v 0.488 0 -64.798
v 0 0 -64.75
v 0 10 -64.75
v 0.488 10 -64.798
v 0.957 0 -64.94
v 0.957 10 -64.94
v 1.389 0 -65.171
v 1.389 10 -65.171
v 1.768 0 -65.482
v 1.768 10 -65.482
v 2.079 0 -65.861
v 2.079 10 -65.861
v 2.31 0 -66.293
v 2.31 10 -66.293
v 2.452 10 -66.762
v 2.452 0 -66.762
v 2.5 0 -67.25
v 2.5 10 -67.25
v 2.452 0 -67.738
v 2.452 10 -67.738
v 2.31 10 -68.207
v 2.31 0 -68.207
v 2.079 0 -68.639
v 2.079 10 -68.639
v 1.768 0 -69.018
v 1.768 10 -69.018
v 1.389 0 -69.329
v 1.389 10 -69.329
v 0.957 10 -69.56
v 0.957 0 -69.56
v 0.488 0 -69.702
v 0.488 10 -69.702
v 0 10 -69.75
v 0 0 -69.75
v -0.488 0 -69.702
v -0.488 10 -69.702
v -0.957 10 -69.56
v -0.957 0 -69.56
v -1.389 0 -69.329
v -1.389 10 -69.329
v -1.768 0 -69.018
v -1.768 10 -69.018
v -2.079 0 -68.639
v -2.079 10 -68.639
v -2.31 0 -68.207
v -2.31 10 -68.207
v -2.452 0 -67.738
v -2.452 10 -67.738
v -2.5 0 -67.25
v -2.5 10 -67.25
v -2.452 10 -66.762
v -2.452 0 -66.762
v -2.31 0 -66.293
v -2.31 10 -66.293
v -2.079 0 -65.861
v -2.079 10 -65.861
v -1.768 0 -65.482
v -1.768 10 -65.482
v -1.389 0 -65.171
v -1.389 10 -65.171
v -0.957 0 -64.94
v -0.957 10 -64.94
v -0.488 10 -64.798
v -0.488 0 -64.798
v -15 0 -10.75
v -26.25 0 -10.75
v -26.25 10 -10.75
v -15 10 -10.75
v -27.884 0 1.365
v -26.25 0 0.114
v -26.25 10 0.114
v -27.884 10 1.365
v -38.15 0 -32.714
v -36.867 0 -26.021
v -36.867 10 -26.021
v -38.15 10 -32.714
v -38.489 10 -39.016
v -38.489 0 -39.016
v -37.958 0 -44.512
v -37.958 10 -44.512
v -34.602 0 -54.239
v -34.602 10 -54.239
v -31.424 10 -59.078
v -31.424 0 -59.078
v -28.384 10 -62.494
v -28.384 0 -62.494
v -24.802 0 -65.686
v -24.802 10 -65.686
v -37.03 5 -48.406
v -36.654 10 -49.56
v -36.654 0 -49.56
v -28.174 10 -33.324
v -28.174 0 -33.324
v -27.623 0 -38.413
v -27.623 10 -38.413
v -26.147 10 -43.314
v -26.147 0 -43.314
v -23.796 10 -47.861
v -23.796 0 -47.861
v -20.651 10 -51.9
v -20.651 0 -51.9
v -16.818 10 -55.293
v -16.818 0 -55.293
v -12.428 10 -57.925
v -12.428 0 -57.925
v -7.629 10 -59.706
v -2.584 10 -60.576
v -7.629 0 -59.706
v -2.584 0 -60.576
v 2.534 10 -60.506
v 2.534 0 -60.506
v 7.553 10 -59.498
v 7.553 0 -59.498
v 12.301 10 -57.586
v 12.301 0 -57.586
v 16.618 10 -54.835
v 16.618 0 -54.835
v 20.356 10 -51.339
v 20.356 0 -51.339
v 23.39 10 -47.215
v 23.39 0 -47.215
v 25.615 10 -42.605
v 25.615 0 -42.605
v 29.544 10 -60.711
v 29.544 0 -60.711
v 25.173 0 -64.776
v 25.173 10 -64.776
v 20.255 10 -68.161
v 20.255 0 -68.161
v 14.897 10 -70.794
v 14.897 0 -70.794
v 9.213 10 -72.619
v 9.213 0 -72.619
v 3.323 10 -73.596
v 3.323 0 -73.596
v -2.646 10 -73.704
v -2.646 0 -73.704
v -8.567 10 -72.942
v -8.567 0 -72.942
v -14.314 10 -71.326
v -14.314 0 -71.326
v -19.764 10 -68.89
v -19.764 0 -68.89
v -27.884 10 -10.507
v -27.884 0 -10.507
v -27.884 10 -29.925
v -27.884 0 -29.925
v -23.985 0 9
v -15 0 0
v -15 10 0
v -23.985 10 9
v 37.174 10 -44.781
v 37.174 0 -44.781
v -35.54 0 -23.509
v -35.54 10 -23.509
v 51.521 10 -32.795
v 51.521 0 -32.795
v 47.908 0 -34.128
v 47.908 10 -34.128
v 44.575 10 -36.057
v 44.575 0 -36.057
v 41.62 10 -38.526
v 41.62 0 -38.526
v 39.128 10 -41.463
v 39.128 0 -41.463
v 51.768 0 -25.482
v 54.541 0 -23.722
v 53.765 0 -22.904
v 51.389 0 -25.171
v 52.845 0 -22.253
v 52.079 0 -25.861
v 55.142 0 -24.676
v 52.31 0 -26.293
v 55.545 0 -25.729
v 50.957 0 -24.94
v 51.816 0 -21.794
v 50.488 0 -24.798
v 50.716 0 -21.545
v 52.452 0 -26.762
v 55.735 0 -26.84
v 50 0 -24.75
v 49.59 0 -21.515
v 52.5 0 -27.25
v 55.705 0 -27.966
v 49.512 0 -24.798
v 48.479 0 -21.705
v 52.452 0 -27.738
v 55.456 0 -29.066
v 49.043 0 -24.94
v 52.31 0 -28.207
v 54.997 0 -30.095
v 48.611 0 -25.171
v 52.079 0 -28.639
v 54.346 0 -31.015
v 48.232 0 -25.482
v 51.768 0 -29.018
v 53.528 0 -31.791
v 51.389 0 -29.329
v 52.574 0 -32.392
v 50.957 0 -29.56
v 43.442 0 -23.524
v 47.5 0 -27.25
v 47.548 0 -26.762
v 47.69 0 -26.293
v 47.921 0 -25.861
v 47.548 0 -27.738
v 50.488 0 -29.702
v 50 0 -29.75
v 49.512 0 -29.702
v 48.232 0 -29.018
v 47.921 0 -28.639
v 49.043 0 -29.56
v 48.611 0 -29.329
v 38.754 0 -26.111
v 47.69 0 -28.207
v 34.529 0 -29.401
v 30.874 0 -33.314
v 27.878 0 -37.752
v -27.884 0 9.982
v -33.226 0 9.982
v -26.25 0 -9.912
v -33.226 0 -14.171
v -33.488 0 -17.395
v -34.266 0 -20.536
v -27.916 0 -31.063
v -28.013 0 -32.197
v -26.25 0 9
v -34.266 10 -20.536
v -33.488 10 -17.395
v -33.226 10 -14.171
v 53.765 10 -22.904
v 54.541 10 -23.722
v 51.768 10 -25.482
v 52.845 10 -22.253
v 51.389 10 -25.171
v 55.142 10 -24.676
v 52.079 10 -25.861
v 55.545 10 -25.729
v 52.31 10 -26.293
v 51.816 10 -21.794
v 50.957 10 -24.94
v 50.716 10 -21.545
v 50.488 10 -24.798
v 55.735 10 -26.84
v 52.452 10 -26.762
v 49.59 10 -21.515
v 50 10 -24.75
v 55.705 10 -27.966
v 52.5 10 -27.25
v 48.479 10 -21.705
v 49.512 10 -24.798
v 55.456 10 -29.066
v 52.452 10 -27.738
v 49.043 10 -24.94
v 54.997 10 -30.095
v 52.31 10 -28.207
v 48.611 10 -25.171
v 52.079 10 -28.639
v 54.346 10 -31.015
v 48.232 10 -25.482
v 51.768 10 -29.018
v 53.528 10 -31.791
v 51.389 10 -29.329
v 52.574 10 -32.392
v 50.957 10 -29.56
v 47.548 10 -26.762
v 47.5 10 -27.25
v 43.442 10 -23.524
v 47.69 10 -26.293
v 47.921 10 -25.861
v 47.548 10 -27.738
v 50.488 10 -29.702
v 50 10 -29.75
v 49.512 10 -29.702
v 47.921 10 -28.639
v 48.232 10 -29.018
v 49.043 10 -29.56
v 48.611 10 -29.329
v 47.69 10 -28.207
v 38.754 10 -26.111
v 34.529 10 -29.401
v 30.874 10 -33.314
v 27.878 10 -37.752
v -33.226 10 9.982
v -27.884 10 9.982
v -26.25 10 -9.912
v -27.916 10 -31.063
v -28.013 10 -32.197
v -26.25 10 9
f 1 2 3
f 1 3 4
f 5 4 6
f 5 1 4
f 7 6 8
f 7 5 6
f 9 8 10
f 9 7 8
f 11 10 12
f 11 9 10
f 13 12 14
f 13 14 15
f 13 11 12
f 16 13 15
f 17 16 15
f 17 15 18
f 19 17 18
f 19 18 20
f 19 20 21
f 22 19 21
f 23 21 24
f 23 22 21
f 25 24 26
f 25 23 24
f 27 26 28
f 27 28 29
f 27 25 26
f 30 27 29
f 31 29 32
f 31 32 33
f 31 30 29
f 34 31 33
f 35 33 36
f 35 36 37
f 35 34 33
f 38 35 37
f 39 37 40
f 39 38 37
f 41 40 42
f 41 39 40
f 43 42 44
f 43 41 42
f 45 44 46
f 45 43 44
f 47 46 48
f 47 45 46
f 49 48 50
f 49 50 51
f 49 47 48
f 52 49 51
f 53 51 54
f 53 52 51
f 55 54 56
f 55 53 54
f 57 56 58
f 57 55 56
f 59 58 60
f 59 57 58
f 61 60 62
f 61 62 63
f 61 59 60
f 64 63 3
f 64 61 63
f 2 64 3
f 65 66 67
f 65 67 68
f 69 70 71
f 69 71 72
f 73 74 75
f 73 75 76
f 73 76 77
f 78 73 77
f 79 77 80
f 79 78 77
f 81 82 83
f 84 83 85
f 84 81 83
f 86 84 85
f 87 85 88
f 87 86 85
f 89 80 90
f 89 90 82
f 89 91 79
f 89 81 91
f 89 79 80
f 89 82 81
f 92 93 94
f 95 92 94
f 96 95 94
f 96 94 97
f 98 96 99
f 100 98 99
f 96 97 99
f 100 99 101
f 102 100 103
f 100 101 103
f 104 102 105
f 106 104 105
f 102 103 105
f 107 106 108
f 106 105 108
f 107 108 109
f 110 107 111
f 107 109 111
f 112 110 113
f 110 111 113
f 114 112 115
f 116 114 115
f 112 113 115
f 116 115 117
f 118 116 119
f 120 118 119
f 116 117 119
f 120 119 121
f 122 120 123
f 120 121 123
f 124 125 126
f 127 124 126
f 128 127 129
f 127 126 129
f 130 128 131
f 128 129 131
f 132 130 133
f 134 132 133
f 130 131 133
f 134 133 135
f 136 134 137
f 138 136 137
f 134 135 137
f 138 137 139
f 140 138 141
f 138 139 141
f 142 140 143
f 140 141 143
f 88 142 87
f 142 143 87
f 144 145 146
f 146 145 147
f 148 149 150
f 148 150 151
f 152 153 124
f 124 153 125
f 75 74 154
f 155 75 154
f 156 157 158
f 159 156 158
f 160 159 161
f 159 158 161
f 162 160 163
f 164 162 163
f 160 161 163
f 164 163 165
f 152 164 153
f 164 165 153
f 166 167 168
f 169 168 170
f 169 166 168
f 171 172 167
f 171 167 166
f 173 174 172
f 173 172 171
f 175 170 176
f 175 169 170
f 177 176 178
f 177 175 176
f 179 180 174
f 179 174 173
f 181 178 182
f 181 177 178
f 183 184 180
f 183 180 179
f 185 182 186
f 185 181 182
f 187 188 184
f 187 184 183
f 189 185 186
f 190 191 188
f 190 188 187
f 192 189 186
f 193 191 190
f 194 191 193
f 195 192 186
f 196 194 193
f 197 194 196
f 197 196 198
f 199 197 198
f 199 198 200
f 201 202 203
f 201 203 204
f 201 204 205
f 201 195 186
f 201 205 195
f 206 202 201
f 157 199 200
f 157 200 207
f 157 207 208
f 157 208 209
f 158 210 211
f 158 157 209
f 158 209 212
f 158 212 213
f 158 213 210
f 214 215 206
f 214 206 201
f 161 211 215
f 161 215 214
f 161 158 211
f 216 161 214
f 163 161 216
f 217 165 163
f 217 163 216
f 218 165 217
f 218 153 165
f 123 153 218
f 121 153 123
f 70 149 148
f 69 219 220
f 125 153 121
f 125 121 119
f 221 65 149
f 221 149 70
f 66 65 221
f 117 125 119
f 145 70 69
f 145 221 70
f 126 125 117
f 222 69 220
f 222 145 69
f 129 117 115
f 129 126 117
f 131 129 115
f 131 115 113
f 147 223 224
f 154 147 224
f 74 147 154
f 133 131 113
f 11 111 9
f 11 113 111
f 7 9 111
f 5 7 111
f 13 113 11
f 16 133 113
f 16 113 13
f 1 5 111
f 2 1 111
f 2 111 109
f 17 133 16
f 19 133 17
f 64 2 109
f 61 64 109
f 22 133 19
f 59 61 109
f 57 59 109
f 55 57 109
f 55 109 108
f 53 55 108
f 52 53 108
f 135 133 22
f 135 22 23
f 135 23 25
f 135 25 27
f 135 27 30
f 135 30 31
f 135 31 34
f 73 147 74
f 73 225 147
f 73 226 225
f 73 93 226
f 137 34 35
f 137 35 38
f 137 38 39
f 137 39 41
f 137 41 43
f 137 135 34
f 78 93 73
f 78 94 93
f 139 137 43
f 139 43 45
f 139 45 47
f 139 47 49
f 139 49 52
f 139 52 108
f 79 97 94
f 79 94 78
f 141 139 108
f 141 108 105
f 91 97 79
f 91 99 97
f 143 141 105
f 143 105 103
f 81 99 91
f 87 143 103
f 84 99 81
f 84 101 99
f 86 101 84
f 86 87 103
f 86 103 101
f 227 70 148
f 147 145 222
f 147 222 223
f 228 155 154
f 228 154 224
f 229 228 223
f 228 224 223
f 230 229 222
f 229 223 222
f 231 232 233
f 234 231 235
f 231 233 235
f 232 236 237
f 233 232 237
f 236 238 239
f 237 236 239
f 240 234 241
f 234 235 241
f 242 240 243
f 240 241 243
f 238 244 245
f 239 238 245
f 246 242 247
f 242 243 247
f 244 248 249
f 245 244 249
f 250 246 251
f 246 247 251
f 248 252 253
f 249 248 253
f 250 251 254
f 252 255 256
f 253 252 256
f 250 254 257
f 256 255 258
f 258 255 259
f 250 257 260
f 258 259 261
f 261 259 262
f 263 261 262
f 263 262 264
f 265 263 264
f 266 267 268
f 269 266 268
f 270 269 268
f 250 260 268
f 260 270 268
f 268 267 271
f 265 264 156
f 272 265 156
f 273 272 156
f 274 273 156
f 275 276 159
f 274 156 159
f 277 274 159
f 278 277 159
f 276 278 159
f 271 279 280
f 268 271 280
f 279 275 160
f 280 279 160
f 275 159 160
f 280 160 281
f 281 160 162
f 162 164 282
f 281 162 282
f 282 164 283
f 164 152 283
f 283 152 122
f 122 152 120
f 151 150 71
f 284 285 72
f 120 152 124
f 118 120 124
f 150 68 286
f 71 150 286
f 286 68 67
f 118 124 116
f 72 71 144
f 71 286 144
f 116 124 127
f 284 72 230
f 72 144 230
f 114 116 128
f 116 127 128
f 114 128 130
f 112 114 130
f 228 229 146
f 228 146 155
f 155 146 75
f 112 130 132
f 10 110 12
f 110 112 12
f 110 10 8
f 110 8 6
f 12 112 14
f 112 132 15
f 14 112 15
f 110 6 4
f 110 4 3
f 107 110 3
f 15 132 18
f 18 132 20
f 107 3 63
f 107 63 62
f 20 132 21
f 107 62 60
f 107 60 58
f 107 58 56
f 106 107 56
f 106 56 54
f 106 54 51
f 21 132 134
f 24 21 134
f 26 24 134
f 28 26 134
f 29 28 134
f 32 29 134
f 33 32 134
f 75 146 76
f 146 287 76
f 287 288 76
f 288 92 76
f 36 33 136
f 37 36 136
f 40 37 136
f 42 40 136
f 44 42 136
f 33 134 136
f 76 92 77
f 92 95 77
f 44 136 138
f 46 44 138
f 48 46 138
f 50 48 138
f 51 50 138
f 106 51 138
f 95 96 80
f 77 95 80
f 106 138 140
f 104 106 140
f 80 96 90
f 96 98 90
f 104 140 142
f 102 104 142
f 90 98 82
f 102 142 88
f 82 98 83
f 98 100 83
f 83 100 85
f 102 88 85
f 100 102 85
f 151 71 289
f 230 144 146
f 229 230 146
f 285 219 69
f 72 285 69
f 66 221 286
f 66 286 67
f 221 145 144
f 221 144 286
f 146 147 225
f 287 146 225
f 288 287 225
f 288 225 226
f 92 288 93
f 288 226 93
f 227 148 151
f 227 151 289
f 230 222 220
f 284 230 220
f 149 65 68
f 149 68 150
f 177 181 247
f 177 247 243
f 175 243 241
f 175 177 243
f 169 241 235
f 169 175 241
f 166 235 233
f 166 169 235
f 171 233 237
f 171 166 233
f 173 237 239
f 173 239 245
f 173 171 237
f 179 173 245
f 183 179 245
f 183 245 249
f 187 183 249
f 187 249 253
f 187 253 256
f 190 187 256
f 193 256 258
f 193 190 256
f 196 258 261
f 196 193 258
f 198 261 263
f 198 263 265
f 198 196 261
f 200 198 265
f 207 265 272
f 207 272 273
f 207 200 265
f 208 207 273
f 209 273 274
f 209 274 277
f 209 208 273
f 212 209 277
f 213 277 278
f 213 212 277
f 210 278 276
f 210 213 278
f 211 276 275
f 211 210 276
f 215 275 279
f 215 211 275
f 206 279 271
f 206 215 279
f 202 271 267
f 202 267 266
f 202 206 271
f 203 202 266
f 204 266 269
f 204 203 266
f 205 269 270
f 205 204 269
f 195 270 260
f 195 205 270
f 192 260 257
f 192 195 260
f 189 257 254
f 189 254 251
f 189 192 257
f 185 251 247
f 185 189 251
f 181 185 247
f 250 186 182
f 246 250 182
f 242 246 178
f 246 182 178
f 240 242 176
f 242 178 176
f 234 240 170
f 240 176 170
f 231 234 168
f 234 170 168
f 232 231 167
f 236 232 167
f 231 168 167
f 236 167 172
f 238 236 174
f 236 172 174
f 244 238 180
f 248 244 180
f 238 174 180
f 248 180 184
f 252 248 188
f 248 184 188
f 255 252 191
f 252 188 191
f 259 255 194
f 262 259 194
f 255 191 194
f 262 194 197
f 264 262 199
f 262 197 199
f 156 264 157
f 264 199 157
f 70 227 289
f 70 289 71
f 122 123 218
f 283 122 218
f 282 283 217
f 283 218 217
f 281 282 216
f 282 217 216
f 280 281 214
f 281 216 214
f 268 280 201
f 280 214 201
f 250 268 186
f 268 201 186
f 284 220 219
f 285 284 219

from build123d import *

# Parameters (mm, degrees)
SKETCH2_R           = 2.5
BOSS_EXTRUDE1_DEPTH = 10
BOSS_EXTRUDE2_DEPTH = 10


with BuildPart() as part:
    # Sketch2 → Boss-Extrude1 (new body)
    with BuildSketch(Plane(origin=(0, 0, 0), x_dir=(1, 0, 0), z_dir=(0, 1, 0))):
        with BuildLine():
            Line((-33.226342232, -9.981880582), (-27.883647244, -9.981880582))
            Line((-27.883647244, -9.981880582), (-27.883647244, 29.925281779))
            ThreePointArc((-27.883647244, 29.925281779), (-27.956490633, 31.630693582), (-28.174490185, 33.323682587))
            ThreePointArc((-28.174490185, 33.323682587), (-5.126582747, 60.257622762), (25.614975975, 42.605434852))
            ThreePointArc((25.614975975, 42.605434852), (34.529334698, 29.401291822), (48.478573237, 21.70493367))
            ThreePointArc((48.478573237, 21.70493367), (55.54506633, 25.728573237), (51.521426763, 32.79506633))
            ThreePointArc((51.521426763, 32.79506633), (43.044695487, 37.228328186), (37.173927096, 44.781000713))
            Line((37.173927096, 44.781000713), (29.544453309, 60.710630122))
            ThreePointArc((29.544453309, 60.710630122), (3.323171133, 73.595527675), (-24.801894282, 65.686234454))
            add(Edge.make_bspline(
                [(-36.866842145, 26.021473673), (-43.224794525, 50.957582374), (-24.801894282, 65.686234454)],
                knots=[0, 0, 0, 1, 1, 1], degree=2))
            Line((-36.866842145, 26.021473673), (-35.540312543, 23.509134839))
            ThreePointArc((-35.540312543, 23.509134839), (-33.813452265, 18.981182225), (-33.226342232, 14.170807697))
            Line((-33.226342232, 14.170807697), (-33.226342232, -9.981880582))
        make_face()
        with Locations(Location((0, 67.25, 0), (0, 0, 270))):
            Circle(SKETCH2_R, mode=Mode.SUBTRACT)
        with Locations(Location((50, 27.25, 0), (0, 0, 270))):
            Circle(SKETCH2_R, mode=Mode.SUBTRACT)
    extrude(amount=BOSS_EXTRUDE1_DEPTH)

    # Sketch1 → Boss-Extrude2 (add)
    with BuildSketch(Plane(origin=(0, 0, 0), x_dir=(1, 0, 0), z_dir=(0, 1, 0))):
        Polygon((-26.25, 10.75), (-15, 10.75), (-15, 0), (-23.984756923, -9), (-26.25, -9), (-26.25, -0.114272299), (-29.438415679, -2.555067389), (-29.438415679, 11.073293435), (-26.25, 9.911985917), align=None)
    extrude(amount=BOSS_EXTRUDE2_DEPTH)


solid = part.part
